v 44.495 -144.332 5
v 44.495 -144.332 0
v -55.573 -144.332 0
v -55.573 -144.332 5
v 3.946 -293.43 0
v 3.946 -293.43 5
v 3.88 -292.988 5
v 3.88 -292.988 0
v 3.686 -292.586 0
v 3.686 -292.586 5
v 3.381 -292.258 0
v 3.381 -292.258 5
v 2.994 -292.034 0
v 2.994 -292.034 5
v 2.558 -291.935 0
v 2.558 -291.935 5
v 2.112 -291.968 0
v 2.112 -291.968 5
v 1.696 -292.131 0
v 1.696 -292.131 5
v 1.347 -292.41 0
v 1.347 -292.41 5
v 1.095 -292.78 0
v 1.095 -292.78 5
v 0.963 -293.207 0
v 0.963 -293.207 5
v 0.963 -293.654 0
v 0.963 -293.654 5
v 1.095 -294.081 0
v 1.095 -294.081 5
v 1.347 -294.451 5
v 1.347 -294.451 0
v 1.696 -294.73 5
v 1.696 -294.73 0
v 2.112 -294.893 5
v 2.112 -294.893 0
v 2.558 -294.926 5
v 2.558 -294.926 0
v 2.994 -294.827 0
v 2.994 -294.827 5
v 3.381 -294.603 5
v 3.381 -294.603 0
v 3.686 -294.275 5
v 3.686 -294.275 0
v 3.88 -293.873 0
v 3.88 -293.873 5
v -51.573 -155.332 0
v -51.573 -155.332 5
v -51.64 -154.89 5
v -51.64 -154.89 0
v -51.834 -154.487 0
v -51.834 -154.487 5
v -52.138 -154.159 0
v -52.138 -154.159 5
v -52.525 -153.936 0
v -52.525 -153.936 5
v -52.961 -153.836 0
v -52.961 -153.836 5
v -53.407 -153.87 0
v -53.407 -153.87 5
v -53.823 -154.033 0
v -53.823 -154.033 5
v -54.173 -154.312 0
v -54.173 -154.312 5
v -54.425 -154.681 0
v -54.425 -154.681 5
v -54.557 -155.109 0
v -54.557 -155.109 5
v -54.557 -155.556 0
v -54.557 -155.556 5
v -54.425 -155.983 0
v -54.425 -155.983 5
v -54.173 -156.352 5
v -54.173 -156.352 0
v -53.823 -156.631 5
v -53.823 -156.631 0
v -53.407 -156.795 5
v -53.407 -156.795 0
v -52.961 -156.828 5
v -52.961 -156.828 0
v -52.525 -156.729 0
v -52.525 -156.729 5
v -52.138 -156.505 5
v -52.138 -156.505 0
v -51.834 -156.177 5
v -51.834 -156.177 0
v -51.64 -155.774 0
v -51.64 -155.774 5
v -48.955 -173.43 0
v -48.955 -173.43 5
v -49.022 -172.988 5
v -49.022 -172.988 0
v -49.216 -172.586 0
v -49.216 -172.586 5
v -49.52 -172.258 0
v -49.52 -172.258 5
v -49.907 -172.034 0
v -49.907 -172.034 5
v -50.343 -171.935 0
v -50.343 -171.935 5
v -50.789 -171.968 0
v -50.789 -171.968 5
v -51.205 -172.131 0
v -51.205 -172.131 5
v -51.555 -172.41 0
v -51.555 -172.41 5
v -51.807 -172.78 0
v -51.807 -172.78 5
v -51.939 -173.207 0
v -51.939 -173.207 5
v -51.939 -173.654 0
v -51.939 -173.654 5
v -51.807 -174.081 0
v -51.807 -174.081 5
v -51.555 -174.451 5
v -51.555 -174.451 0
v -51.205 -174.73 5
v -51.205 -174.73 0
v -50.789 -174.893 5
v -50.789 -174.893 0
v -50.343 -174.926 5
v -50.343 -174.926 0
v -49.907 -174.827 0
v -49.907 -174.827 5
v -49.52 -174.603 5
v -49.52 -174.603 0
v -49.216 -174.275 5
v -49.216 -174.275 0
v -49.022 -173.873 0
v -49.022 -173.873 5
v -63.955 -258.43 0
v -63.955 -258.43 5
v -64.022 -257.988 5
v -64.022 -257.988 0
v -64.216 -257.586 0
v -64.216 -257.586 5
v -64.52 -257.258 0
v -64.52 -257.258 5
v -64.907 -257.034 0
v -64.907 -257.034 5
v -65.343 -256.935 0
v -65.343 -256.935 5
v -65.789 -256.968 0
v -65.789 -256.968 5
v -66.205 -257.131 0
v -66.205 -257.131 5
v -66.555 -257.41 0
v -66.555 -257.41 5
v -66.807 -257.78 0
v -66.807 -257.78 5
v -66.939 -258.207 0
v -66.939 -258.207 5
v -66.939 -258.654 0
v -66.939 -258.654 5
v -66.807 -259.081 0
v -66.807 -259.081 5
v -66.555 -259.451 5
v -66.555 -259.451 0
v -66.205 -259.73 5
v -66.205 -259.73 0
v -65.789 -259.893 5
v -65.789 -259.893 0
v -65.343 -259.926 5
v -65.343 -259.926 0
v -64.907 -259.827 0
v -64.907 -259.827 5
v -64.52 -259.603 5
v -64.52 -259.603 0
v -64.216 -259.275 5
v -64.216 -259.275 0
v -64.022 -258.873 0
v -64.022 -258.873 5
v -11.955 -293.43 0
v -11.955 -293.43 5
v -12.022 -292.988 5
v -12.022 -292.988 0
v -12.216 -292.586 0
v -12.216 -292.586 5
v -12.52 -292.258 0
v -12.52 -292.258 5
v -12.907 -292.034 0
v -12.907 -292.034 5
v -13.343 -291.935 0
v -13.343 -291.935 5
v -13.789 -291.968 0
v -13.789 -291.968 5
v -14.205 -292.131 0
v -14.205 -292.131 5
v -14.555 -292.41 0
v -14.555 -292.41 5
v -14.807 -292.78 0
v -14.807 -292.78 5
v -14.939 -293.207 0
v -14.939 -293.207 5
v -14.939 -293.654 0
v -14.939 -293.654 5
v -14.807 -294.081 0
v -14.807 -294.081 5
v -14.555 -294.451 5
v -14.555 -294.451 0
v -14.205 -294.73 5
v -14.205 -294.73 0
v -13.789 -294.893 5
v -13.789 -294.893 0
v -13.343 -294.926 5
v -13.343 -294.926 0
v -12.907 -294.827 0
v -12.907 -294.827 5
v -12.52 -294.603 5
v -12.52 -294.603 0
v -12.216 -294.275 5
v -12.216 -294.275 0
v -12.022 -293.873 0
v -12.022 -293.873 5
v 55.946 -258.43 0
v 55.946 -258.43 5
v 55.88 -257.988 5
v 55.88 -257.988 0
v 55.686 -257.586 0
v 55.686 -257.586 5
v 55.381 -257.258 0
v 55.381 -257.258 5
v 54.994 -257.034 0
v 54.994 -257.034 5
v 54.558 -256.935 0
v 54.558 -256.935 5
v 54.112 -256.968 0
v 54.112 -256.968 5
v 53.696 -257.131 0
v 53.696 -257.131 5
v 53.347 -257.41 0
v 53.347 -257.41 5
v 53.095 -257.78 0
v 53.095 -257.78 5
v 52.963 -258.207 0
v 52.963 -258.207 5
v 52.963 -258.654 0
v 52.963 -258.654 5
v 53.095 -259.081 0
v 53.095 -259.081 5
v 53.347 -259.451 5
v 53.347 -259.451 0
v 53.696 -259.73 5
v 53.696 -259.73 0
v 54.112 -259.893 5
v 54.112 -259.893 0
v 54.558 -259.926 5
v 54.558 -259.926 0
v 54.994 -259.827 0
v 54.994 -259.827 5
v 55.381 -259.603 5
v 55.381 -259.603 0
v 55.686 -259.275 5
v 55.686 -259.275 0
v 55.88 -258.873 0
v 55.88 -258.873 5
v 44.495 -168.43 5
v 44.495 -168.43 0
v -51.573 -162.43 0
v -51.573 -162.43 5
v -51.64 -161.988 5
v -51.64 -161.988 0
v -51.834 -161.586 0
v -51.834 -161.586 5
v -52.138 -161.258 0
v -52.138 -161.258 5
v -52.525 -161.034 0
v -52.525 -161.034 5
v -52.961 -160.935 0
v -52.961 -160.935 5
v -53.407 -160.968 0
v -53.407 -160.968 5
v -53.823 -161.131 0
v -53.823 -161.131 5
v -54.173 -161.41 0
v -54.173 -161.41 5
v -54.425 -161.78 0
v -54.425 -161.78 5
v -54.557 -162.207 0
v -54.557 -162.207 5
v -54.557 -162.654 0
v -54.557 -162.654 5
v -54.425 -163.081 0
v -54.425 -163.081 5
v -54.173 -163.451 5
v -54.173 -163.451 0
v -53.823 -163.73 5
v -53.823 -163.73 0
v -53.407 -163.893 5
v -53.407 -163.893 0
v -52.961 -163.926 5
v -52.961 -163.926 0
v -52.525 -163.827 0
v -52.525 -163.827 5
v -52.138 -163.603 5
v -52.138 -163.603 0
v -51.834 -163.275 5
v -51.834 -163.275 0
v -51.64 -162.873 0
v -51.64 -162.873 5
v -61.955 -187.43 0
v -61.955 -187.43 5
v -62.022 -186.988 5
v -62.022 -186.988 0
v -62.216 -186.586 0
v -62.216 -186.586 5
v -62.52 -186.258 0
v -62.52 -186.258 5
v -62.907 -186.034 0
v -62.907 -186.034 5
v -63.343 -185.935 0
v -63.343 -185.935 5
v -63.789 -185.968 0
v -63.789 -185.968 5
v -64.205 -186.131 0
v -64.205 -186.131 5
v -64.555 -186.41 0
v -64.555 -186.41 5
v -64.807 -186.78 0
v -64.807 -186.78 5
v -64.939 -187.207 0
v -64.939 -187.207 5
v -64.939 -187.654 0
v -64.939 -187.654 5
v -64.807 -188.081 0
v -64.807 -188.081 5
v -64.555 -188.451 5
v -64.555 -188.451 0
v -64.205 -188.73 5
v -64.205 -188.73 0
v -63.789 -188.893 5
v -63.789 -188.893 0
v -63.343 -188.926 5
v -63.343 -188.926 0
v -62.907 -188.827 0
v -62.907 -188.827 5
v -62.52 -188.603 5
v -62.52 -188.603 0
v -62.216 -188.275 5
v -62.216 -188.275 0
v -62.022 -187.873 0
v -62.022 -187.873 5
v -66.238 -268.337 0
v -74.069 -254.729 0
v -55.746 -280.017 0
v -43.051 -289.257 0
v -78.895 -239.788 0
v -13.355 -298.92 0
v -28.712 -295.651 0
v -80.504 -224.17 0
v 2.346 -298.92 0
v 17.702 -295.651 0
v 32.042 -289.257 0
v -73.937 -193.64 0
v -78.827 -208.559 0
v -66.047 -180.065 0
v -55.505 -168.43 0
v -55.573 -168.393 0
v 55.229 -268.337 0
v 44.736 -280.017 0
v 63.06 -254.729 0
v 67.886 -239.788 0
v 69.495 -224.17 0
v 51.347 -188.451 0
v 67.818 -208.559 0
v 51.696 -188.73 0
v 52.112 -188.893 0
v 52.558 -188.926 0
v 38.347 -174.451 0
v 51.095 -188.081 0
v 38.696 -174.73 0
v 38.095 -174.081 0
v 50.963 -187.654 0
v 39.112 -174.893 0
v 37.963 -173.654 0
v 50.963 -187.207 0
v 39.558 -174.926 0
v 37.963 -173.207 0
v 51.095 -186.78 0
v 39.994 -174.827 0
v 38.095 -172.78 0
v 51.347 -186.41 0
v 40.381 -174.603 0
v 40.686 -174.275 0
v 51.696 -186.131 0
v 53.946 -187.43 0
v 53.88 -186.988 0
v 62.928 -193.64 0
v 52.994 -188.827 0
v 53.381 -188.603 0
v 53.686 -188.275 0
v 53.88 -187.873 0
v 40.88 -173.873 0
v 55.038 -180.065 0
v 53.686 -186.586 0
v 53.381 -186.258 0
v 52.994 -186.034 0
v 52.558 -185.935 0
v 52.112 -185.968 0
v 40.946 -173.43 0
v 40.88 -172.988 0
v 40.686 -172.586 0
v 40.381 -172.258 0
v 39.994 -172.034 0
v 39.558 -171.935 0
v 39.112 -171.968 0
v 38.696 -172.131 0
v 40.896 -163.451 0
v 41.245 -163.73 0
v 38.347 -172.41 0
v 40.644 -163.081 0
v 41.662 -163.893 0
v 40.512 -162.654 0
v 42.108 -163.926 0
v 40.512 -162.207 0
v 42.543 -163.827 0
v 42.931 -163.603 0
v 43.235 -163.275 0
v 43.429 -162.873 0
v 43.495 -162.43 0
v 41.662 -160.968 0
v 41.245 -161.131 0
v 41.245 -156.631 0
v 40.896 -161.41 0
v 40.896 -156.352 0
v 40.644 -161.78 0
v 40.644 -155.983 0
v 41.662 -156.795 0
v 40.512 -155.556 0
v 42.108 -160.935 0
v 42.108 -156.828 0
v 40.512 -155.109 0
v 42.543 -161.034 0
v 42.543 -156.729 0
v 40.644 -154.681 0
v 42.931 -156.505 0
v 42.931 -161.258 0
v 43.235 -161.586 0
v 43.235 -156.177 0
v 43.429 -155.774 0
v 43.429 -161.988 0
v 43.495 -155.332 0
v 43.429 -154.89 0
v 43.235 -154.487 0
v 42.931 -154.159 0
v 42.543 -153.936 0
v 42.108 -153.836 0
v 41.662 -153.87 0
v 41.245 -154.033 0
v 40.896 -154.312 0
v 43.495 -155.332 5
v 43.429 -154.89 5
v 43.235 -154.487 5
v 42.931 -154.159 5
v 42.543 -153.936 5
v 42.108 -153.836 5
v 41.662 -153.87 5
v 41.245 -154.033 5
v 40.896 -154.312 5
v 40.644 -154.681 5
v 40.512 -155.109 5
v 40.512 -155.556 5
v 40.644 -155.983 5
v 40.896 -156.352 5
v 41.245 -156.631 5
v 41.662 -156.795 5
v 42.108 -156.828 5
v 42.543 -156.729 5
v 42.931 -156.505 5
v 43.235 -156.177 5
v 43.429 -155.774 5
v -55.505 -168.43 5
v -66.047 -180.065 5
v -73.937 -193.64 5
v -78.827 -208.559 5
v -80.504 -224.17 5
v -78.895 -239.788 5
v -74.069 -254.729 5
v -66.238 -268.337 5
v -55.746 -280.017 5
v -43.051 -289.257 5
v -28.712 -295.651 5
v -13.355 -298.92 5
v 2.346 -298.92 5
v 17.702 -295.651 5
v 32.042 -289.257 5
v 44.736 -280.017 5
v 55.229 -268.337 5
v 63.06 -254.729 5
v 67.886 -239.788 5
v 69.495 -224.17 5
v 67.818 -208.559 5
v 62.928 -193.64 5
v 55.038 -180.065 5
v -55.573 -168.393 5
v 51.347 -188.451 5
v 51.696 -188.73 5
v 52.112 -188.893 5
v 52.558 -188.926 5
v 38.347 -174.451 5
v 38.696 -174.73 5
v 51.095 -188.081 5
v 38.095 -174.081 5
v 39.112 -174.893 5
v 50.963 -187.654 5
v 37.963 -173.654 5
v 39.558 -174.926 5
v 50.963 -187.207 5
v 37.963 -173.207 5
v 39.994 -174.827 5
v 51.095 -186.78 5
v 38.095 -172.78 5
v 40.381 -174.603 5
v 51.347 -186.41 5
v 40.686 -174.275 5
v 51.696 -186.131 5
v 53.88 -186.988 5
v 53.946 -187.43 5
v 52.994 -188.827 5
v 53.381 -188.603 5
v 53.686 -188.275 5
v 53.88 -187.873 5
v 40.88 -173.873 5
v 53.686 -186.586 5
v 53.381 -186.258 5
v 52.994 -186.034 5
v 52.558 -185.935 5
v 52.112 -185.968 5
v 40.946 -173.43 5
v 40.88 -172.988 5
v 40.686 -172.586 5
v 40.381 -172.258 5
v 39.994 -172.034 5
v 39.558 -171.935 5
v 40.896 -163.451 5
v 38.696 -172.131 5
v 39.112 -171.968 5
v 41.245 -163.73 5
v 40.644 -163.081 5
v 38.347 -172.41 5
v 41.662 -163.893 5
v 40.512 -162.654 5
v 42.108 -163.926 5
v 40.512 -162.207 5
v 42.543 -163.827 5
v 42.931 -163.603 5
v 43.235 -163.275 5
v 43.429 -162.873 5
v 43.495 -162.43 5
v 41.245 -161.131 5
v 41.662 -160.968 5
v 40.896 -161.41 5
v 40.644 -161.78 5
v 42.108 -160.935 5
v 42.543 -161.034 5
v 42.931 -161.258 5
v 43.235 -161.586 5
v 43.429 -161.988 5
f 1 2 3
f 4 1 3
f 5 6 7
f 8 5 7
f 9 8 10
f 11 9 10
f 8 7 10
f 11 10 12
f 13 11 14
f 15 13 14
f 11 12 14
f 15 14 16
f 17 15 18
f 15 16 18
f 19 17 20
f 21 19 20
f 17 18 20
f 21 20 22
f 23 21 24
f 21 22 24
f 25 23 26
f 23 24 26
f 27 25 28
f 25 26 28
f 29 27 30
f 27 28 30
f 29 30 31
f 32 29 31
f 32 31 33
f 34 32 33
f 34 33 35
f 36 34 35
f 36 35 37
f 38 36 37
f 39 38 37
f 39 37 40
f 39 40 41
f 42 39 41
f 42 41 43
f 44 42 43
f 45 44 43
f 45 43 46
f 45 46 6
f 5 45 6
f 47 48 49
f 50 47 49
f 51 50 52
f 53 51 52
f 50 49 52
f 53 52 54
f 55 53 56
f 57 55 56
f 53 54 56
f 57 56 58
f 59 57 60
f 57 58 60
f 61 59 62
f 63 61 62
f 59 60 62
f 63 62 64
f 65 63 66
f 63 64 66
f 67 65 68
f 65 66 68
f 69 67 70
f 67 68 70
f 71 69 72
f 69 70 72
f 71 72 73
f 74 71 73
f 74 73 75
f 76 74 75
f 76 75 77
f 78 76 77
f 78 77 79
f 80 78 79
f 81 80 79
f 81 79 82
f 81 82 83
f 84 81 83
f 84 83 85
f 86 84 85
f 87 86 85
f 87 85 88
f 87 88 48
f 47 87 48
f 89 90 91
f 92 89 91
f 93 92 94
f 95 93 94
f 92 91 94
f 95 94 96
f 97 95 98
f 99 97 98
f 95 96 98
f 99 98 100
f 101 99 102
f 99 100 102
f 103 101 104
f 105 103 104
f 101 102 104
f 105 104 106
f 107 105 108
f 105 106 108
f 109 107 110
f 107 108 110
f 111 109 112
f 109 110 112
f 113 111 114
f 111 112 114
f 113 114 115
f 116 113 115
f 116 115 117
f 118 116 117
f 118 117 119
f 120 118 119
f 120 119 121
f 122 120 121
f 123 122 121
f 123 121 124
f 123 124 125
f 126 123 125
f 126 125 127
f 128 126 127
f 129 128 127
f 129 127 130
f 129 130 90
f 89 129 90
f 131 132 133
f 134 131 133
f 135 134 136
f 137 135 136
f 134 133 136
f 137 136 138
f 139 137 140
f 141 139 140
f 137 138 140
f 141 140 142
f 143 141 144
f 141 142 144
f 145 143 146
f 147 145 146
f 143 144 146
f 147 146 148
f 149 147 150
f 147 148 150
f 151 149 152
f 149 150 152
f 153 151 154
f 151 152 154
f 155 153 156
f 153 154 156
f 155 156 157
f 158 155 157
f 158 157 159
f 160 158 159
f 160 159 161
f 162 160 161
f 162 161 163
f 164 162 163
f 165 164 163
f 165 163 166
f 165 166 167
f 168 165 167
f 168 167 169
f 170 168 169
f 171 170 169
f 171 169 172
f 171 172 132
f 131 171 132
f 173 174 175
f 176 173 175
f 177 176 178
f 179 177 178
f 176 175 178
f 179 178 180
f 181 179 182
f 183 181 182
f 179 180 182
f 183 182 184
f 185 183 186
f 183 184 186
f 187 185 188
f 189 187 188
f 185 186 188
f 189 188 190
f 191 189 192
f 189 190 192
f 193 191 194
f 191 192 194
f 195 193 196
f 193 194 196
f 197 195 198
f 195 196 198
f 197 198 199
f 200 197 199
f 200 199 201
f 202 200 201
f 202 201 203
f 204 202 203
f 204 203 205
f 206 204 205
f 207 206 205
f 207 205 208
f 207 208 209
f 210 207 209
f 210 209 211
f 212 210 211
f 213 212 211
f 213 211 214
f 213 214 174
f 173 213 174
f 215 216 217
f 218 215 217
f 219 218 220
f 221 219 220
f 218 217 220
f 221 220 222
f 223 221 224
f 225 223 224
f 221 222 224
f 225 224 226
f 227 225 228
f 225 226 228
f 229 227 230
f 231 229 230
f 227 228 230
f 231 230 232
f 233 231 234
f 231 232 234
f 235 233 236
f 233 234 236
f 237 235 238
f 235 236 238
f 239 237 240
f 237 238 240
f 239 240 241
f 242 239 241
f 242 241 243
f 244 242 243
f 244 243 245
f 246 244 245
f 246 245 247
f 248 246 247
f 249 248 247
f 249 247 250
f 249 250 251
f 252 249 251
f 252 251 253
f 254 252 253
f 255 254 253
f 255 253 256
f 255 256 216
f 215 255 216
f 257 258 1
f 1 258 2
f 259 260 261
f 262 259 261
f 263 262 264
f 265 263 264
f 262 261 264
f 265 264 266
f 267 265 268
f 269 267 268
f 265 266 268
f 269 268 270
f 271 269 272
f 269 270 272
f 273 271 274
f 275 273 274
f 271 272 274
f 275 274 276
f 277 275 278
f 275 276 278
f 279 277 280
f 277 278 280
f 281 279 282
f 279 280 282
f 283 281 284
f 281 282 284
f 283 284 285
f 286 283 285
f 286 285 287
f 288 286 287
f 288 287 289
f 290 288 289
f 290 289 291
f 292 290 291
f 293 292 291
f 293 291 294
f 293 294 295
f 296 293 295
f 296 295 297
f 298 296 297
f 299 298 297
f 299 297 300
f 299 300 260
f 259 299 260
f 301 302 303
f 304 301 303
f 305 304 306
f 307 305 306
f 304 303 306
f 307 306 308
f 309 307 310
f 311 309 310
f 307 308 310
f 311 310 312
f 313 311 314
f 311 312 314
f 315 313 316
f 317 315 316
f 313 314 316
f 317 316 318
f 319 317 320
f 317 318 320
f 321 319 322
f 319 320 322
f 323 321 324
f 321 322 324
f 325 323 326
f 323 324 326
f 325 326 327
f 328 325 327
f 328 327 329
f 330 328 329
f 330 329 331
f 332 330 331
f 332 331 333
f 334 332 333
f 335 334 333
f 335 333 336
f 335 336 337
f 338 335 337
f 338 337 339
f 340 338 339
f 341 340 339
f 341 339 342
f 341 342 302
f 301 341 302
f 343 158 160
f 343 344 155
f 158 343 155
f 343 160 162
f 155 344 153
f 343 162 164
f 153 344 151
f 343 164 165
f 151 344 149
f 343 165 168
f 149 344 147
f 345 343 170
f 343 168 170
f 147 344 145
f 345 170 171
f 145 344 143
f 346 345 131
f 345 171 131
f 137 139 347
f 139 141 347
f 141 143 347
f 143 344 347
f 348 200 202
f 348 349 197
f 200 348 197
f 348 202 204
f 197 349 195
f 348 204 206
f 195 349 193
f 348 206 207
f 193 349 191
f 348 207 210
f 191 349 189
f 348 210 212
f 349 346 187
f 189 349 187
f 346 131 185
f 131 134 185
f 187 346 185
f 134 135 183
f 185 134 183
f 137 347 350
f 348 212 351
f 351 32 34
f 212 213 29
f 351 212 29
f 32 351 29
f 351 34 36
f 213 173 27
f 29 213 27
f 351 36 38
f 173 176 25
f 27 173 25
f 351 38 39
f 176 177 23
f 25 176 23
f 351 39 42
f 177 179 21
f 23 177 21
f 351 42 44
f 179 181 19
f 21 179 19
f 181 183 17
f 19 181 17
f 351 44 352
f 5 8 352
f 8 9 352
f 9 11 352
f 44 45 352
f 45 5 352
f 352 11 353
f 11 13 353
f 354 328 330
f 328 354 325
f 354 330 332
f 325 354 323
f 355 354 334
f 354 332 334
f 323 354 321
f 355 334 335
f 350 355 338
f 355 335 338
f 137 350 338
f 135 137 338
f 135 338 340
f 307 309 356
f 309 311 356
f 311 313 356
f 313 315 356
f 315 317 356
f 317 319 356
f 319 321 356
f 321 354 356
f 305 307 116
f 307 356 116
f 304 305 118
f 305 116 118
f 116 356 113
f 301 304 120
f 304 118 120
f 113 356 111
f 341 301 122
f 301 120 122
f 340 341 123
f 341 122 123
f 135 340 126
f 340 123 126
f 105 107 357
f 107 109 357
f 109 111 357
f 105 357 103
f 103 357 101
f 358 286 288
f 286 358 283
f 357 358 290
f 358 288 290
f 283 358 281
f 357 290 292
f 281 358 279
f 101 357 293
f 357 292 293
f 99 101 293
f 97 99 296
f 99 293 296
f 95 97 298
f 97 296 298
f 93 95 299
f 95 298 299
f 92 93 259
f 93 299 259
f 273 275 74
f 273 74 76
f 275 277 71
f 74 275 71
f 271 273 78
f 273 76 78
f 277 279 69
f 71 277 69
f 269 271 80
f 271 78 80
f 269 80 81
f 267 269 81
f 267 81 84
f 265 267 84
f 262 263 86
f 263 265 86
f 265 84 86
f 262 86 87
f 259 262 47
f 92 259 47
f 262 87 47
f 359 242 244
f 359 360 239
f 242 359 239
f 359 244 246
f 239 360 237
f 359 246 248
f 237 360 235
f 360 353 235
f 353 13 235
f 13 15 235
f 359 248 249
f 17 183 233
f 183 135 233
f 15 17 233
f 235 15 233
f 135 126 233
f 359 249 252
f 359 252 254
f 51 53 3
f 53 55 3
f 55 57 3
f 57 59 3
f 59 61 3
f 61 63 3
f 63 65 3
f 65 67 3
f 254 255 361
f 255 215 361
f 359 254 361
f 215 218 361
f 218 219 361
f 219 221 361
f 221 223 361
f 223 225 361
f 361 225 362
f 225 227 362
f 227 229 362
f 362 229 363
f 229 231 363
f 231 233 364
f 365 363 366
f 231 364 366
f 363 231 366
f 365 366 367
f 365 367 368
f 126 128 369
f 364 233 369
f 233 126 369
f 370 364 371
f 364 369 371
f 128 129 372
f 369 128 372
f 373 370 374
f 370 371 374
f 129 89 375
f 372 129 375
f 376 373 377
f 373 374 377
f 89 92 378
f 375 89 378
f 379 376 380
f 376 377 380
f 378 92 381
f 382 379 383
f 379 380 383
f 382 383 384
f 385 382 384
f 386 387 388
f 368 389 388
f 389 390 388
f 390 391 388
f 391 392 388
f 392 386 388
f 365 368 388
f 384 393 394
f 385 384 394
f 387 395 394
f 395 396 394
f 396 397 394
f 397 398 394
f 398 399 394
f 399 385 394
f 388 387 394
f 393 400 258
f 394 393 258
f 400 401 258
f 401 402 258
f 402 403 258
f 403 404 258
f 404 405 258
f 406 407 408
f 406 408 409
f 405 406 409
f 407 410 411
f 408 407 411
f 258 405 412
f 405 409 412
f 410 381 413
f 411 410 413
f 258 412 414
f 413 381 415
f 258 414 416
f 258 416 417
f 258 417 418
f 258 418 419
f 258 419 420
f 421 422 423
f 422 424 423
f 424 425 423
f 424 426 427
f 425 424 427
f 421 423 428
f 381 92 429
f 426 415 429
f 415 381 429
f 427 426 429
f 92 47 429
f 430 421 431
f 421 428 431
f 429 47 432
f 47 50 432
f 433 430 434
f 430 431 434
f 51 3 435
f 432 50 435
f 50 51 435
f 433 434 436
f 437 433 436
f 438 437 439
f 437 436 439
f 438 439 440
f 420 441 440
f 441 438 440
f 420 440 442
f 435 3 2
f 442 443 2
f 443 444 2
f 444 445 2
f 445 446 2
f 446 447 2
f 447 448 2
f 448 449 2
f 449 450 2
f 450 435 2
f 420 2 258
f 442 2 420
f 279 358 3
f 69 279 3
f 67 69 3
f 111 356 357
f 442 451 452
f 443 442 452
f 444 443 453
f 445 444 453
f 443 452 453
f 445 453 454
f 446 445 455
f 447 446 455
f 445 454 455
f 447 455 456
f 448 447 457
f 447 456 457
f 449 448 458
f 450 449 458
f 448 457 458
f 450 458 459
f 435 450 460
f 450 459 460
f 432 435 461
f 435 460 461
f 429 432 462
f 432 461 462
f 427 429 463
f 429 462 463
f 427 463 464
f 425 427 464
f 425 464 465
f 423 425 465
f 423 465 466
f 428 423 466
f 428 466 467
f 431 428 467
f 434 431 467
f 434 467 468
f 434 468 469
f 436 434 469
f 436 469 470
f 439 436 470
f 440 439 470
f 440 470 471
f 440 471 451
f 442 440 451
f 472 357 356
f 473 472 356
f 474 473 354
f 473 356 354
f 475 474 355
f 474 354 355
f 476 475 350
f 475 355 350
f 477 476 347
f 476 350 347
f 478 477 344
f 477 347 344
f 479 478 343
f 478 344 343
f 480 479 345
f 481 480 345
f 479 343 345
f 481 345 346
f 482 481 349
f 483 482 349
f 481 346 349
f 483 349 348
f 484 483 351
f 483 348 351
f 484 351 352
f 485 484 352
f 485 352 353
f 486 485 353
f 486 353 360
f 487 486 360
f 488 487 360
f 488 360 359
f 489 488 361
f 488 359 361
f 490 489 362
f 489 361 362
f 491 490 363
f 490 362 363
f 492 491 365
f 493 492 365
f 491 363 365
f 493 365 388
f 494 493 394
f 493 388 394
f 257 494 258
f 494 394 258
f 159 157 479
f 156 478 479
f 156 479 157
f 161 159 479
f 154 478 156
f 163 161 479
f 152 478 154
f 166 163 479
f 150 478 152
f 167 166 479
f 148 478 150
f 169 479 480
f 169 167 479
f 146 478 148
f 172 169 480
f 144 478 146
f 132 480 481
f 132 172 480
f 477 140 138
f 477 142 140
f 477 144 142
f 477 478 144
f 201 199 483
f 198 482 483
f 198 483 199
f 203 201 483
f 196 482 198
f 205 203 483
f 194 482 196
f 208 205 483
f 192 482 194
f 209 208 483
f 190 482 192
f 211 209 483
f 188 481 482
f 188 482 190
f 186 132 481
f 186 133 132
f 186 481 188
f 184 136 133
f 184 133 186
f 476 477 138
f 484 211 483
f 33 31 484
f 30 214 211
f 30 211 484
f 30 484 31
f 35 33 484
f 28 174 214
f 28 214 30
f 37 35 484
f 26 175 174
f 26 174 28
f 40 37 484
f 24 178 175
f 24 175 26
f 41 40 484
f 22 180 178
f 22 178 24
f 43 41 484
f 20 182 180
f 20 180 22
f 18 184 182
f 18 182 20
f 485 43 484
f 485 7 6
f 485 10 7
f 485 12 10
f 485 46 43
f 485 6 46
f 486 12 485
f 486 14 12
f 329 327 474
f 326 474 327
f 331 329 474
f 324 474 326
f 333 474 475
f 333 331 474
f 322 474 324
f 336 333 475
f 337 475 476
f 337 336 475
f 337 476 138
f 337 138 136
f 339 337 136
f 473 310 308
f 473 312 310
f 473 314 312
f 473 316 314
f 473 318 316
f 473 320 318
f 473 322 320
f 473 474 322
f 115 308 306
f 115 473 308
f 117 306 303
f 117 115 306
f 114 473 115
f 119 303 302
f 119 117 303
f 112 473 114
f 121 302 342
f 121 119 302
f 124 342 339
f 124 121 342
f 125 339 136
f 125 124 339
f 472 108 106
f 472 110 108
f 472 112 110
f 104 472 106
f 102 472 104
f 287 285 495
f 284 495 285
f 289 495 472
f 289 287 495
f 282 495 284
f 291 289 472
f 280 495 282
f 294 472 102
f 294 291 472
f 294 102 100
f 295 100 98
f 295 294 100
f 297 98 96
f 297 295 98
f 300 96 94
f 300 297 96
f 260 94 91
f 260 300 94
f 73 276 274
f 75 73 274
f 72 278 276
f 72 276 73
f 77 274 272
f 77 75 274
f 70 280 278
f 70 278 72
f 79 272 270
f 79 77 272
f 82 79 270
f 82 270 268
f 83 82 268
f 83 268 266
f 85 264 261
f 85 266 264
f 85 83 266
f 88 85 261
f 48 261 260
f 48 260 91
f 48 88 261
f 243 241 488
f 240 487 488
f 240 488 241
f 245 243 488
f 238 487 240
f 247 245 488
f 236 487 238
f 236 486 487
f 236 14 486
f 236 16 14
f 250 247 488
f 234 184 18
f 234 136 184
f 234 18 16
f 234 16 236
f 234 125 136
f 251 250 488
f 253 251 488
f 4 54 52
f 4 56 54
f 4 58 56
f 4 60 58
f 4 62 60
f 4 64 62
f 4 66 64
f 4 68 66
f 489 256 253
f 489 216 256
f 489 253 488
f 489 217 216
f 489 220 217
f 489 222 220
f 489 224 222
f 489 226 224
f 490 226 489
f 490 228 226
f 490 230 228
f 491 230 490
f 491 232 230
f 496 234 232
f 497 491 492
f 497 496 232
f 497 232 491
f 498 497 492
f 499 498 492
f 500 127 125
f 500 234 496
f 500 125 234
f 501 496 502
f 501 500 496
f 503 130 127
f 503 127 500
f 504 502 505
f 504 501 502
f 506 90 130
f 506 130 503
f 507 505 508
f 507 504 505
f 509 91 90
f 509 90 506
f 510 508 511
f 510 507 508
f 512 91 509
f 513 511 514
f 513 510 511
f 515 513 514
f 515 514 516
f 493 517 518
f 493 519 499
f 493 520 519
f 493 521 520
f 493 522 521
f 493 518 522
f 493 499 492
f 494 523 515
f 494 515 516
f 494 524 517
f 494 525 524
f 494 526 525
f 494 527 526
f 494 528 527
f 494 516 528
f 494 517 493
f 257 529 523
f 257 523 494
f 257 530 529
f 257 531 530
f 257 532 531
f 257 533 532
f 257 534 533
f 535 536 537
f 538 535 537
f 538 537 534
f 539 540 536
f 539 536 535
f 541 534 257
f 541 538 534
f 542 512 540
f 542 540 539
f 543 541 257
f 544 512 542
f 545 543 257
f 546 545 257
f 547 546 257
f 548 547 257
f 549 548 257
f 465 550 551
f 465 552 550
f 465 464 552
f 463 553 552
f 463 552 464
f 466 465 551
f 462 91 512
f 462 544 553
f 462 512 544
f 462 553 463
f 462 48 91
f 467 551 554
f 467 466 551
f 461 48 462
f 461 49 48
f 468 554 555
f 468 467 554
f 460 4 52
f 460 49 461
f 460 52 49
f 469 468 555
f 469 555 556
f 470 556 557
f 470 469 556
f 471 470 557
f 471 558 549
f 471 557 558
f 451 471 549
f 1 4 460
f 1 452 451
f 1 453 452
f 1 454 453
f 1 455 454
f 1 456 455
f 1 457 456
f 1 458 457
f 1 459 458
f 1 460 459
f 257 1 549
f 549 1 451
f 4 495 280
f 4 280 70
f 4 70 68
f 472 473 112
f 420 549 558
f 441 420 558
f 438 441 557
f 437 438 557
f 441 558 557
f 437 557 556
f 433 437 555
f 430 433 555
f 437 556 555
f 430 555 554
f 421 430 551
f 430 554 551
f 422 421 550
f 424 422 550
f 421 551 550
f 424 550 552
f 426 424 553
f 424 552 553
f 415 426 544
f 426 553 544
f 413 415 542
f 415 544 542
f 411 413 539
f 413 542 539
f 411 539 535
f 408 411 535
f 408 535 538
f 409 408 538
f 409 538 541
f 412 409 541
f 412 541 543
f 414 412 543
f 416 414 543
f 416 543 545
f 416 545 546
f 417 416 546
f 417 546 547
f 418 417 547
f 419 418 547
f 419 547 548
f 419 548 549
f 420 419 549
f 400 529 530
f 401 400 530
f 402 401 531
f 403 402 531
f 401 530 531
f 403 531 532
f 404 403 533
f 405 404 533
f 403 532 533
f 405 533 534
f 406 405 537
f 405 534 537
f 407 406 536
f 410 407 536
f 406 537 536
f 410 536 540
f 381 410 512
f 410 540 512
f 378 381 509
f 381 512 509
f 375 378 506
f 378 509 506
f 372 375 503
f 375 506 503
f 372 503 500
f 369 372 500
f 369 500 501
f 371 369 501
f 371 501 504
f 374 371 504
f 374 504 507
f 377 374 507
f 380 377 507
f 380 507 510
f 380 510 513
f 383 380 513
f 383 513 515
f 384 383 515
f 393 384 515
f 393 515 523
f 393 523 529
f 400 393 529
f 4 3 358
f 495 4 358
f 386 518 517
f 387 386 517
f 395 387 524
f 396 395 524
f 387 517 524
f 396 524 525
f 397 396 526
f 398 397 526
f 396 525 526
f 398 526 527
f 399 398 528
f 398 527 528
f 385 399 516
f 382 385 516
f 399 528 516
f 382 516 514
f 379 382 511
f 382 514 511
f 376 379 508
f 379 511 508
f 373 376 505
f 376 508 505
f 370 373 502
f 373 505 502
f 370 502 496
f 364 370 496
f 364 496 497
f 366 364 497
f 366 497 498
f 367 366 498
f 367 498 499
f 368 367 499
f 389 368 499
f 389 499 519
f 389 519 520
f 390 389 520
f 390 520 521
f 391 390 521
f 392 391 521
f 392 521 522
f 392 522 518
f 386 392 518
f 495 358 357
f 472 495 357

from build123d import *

# Parameters (mm, degrees)
RESSALTO_EXTRUS_O1_DEPTH = 5
ESBO_O2_R                = 1.5
CORTE_EXTRUS_O1_DEPTH    = 10
ESBO_O3_R                = 1.5
CORTE_EXTRUS_O2_DEPTH    = 6


with BuildPart() as part:
    # Esboço1 → Ressalto-extrusão1 (new body)
    with BuildSketch(Plane.XY):
        with BuildLine():
            Line((44.495405461, -168.430491325), (44.495405461, -144.332190763))
            Line((44.495405461, -144.332190763), (-55.573351401, -144.332190763))
            Line((-55.573351401, -144.332190763), (-55.573351401, -168.393072388))
            Line((-55.573351401, -168.393072388), (-55.504594539, -168.430491325))
            ThreePointArc((-55.504594539, -168.430491325), (-5.504594539, -299.332190763), (44.495405461, -168.430491325))
        make_face()
    extrude(amount=RESSALTO_EXTRUS_O1_DEPTH)

    # Esboço2 → Corte-extrusão1 (cut)
    with BuildSketch(Plane.XY.offset(5)):
        with Locations((39.44625518, -173.430491325)):
            Circle(ESBO_O2_R)
        with Locations((52.44625518, -187.430491325)):
            Circle(ESBO_O2_R)
        with Locations((54.44625518, -258.430491325)):
            Circle(ESBO_O2_R)
        with Locations((-13.455444258, -293.430491325)):
            Circle(ESBO_O2_R)
        with Locations((2.44625518, -293.430491325)):
            Circle(ESBO_O2_R)
        with Locations((-65.455444258, -258.430491325)):
            Circle(ESBO_O2_R)
        with Locations((-63.455444258, -187.430491325)):
            Circle(ESBO_O2_R)
        with Locations((-50.455444258, -173.430491325)):
            Circle(ESBO_O2_R)
    extrude(amount=-CORTE_EXTRUS_O1_DEPTH, mode=Mode.SUBTRACT)

    # Esboço3 → Corte-extrusão2 (cut, through all)
    with BuildSketch(Plane.XY.offset(5)):
        with Locations((-53.073351401, -162.430491325)):
            Circle(ESBO_O3_R)
        with Locations((-53.073351401, -155.332190763)):
            Circle(ESBO_O3_R)
        with Locations((41.995405461, -162.430491325)):
            Circle(ESBO_O3_R)
        with Locations((41.995405461, -155.332190763)):
            Circle(ESBO_O3_R)
    extrude(amount=-CORTE_EXTRUS_O2_DEPTH, mode=Mode.SUBTRACT)


solid = part.part
